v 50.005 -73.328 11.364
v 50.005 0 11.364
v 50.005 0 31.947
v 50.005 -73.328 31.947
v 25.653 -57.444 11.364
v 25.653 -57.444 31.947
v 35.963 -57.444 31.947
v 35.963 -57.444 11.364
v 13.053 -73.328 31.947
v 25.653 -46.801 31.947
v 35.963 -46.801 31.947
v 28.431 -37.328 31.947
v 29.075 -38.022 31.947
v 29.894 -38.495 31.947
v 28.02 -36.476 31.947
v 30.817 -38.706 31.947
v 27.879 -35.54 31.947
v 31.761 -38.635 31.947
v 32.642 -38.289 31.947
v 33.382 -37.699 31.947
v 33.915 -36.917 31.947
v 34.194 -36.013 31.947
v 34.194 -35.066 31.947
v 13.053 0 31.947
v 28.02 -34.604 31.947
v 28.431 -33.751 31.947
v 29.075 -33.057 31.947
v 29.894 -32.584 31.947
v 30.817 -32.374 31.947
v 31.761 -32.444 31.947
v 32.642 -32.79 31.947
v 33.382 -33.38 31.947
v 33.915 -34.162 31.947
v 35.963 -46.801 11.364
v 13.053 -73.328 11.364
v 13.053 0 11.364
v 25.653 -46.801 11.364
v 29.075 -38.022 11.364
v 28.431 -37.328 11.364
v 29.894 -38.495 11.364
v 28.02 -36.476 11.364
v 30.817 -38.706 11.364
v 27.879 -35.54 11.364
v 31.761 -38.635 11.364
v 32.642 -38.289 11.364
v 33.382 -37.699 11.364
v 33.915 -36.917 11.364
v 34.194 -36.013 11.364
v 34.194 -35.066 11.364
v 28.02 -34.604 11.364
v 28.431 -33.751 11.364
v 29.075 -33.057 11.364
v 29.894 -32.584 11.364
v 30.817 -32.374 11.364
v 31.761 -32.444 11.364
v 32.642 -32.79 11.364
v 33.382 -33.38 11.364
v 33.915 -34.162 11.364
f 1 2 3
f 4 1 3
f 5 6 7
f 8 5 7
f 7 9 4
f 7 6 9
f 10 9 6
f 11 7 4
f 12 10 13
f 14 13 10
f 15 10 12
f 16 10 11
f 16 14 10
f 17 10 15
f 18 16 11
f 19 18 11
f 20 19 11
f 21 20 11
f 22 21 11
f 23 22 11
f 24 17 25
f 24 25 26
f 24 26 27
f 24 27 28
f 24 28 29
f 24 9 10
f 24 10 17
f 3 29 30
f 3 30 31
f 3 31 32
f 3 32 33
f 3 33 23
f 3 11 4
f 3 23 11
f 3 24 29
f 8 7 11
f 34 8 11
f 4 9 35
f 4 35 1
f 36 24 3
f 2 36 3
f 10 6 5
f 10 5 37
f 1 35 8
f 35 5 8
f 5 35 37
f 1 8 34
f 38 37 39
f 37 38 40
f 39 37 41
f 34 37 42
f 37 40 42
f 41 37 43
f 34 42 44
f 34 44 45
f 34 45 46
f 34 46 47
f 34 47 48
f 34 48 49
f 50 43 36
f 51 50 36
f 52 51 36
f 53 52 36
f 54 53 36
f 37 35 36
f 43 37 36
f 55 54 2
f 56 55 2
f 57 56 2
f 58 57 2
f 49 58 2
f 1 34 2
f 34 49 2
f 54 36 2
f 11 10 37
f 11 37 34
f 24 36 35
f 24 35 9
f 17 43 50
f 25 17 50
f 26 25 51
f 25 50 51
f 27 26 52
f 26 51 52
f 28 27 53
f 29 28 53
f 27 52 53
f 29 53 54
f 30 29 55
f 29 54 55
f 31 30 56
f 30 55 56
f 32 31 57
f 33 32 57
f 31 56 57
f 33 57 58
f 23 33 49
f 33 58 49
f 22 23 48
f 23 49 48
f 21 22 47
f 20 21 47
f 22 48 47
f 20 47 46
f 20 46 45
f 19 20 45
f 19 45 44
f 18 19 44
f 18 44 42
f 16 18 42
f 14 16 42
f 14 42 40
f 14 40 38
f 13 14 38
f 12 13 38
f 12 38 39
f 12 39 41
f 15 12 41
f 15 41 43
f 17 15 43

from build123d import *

# Parameters (mm, degrees)
F0_W     = 36.951749
F0_H     = 20.582954
F1_DEPTH = 73.328344
F4_D     = 6.35
F5_W     = 10.310262
F5_H     = 10.642964
F3_DEPTH = 25.4


with BuildPart() as f1:
    # F0 (on Front) → F1 (new body)
    with BuildSketch(Plane.XZ):
        with Locations((31.52898, 21.655689)):
            Rectangle(F0_W, F0_H)
    extrude(amount=F1_DEPTH)

    # F4 (through all)
    with Locations(Plane.XY.offset(31.947166)):
        with Locations((31.054407, -35.539657)):
            Hole(F4_D / 2)

    # F5 (on face) → F3 (cut)
    with BuildSketch(Plane.XY.offset(31.947166)):
        with Locations((30.807659, -52.12252)):
            Rectangle(F5_W, F5_H)
    extrude(amount=-F3_DEPTH, mode=Mode.SUBTRACT)


solid = f1.part
